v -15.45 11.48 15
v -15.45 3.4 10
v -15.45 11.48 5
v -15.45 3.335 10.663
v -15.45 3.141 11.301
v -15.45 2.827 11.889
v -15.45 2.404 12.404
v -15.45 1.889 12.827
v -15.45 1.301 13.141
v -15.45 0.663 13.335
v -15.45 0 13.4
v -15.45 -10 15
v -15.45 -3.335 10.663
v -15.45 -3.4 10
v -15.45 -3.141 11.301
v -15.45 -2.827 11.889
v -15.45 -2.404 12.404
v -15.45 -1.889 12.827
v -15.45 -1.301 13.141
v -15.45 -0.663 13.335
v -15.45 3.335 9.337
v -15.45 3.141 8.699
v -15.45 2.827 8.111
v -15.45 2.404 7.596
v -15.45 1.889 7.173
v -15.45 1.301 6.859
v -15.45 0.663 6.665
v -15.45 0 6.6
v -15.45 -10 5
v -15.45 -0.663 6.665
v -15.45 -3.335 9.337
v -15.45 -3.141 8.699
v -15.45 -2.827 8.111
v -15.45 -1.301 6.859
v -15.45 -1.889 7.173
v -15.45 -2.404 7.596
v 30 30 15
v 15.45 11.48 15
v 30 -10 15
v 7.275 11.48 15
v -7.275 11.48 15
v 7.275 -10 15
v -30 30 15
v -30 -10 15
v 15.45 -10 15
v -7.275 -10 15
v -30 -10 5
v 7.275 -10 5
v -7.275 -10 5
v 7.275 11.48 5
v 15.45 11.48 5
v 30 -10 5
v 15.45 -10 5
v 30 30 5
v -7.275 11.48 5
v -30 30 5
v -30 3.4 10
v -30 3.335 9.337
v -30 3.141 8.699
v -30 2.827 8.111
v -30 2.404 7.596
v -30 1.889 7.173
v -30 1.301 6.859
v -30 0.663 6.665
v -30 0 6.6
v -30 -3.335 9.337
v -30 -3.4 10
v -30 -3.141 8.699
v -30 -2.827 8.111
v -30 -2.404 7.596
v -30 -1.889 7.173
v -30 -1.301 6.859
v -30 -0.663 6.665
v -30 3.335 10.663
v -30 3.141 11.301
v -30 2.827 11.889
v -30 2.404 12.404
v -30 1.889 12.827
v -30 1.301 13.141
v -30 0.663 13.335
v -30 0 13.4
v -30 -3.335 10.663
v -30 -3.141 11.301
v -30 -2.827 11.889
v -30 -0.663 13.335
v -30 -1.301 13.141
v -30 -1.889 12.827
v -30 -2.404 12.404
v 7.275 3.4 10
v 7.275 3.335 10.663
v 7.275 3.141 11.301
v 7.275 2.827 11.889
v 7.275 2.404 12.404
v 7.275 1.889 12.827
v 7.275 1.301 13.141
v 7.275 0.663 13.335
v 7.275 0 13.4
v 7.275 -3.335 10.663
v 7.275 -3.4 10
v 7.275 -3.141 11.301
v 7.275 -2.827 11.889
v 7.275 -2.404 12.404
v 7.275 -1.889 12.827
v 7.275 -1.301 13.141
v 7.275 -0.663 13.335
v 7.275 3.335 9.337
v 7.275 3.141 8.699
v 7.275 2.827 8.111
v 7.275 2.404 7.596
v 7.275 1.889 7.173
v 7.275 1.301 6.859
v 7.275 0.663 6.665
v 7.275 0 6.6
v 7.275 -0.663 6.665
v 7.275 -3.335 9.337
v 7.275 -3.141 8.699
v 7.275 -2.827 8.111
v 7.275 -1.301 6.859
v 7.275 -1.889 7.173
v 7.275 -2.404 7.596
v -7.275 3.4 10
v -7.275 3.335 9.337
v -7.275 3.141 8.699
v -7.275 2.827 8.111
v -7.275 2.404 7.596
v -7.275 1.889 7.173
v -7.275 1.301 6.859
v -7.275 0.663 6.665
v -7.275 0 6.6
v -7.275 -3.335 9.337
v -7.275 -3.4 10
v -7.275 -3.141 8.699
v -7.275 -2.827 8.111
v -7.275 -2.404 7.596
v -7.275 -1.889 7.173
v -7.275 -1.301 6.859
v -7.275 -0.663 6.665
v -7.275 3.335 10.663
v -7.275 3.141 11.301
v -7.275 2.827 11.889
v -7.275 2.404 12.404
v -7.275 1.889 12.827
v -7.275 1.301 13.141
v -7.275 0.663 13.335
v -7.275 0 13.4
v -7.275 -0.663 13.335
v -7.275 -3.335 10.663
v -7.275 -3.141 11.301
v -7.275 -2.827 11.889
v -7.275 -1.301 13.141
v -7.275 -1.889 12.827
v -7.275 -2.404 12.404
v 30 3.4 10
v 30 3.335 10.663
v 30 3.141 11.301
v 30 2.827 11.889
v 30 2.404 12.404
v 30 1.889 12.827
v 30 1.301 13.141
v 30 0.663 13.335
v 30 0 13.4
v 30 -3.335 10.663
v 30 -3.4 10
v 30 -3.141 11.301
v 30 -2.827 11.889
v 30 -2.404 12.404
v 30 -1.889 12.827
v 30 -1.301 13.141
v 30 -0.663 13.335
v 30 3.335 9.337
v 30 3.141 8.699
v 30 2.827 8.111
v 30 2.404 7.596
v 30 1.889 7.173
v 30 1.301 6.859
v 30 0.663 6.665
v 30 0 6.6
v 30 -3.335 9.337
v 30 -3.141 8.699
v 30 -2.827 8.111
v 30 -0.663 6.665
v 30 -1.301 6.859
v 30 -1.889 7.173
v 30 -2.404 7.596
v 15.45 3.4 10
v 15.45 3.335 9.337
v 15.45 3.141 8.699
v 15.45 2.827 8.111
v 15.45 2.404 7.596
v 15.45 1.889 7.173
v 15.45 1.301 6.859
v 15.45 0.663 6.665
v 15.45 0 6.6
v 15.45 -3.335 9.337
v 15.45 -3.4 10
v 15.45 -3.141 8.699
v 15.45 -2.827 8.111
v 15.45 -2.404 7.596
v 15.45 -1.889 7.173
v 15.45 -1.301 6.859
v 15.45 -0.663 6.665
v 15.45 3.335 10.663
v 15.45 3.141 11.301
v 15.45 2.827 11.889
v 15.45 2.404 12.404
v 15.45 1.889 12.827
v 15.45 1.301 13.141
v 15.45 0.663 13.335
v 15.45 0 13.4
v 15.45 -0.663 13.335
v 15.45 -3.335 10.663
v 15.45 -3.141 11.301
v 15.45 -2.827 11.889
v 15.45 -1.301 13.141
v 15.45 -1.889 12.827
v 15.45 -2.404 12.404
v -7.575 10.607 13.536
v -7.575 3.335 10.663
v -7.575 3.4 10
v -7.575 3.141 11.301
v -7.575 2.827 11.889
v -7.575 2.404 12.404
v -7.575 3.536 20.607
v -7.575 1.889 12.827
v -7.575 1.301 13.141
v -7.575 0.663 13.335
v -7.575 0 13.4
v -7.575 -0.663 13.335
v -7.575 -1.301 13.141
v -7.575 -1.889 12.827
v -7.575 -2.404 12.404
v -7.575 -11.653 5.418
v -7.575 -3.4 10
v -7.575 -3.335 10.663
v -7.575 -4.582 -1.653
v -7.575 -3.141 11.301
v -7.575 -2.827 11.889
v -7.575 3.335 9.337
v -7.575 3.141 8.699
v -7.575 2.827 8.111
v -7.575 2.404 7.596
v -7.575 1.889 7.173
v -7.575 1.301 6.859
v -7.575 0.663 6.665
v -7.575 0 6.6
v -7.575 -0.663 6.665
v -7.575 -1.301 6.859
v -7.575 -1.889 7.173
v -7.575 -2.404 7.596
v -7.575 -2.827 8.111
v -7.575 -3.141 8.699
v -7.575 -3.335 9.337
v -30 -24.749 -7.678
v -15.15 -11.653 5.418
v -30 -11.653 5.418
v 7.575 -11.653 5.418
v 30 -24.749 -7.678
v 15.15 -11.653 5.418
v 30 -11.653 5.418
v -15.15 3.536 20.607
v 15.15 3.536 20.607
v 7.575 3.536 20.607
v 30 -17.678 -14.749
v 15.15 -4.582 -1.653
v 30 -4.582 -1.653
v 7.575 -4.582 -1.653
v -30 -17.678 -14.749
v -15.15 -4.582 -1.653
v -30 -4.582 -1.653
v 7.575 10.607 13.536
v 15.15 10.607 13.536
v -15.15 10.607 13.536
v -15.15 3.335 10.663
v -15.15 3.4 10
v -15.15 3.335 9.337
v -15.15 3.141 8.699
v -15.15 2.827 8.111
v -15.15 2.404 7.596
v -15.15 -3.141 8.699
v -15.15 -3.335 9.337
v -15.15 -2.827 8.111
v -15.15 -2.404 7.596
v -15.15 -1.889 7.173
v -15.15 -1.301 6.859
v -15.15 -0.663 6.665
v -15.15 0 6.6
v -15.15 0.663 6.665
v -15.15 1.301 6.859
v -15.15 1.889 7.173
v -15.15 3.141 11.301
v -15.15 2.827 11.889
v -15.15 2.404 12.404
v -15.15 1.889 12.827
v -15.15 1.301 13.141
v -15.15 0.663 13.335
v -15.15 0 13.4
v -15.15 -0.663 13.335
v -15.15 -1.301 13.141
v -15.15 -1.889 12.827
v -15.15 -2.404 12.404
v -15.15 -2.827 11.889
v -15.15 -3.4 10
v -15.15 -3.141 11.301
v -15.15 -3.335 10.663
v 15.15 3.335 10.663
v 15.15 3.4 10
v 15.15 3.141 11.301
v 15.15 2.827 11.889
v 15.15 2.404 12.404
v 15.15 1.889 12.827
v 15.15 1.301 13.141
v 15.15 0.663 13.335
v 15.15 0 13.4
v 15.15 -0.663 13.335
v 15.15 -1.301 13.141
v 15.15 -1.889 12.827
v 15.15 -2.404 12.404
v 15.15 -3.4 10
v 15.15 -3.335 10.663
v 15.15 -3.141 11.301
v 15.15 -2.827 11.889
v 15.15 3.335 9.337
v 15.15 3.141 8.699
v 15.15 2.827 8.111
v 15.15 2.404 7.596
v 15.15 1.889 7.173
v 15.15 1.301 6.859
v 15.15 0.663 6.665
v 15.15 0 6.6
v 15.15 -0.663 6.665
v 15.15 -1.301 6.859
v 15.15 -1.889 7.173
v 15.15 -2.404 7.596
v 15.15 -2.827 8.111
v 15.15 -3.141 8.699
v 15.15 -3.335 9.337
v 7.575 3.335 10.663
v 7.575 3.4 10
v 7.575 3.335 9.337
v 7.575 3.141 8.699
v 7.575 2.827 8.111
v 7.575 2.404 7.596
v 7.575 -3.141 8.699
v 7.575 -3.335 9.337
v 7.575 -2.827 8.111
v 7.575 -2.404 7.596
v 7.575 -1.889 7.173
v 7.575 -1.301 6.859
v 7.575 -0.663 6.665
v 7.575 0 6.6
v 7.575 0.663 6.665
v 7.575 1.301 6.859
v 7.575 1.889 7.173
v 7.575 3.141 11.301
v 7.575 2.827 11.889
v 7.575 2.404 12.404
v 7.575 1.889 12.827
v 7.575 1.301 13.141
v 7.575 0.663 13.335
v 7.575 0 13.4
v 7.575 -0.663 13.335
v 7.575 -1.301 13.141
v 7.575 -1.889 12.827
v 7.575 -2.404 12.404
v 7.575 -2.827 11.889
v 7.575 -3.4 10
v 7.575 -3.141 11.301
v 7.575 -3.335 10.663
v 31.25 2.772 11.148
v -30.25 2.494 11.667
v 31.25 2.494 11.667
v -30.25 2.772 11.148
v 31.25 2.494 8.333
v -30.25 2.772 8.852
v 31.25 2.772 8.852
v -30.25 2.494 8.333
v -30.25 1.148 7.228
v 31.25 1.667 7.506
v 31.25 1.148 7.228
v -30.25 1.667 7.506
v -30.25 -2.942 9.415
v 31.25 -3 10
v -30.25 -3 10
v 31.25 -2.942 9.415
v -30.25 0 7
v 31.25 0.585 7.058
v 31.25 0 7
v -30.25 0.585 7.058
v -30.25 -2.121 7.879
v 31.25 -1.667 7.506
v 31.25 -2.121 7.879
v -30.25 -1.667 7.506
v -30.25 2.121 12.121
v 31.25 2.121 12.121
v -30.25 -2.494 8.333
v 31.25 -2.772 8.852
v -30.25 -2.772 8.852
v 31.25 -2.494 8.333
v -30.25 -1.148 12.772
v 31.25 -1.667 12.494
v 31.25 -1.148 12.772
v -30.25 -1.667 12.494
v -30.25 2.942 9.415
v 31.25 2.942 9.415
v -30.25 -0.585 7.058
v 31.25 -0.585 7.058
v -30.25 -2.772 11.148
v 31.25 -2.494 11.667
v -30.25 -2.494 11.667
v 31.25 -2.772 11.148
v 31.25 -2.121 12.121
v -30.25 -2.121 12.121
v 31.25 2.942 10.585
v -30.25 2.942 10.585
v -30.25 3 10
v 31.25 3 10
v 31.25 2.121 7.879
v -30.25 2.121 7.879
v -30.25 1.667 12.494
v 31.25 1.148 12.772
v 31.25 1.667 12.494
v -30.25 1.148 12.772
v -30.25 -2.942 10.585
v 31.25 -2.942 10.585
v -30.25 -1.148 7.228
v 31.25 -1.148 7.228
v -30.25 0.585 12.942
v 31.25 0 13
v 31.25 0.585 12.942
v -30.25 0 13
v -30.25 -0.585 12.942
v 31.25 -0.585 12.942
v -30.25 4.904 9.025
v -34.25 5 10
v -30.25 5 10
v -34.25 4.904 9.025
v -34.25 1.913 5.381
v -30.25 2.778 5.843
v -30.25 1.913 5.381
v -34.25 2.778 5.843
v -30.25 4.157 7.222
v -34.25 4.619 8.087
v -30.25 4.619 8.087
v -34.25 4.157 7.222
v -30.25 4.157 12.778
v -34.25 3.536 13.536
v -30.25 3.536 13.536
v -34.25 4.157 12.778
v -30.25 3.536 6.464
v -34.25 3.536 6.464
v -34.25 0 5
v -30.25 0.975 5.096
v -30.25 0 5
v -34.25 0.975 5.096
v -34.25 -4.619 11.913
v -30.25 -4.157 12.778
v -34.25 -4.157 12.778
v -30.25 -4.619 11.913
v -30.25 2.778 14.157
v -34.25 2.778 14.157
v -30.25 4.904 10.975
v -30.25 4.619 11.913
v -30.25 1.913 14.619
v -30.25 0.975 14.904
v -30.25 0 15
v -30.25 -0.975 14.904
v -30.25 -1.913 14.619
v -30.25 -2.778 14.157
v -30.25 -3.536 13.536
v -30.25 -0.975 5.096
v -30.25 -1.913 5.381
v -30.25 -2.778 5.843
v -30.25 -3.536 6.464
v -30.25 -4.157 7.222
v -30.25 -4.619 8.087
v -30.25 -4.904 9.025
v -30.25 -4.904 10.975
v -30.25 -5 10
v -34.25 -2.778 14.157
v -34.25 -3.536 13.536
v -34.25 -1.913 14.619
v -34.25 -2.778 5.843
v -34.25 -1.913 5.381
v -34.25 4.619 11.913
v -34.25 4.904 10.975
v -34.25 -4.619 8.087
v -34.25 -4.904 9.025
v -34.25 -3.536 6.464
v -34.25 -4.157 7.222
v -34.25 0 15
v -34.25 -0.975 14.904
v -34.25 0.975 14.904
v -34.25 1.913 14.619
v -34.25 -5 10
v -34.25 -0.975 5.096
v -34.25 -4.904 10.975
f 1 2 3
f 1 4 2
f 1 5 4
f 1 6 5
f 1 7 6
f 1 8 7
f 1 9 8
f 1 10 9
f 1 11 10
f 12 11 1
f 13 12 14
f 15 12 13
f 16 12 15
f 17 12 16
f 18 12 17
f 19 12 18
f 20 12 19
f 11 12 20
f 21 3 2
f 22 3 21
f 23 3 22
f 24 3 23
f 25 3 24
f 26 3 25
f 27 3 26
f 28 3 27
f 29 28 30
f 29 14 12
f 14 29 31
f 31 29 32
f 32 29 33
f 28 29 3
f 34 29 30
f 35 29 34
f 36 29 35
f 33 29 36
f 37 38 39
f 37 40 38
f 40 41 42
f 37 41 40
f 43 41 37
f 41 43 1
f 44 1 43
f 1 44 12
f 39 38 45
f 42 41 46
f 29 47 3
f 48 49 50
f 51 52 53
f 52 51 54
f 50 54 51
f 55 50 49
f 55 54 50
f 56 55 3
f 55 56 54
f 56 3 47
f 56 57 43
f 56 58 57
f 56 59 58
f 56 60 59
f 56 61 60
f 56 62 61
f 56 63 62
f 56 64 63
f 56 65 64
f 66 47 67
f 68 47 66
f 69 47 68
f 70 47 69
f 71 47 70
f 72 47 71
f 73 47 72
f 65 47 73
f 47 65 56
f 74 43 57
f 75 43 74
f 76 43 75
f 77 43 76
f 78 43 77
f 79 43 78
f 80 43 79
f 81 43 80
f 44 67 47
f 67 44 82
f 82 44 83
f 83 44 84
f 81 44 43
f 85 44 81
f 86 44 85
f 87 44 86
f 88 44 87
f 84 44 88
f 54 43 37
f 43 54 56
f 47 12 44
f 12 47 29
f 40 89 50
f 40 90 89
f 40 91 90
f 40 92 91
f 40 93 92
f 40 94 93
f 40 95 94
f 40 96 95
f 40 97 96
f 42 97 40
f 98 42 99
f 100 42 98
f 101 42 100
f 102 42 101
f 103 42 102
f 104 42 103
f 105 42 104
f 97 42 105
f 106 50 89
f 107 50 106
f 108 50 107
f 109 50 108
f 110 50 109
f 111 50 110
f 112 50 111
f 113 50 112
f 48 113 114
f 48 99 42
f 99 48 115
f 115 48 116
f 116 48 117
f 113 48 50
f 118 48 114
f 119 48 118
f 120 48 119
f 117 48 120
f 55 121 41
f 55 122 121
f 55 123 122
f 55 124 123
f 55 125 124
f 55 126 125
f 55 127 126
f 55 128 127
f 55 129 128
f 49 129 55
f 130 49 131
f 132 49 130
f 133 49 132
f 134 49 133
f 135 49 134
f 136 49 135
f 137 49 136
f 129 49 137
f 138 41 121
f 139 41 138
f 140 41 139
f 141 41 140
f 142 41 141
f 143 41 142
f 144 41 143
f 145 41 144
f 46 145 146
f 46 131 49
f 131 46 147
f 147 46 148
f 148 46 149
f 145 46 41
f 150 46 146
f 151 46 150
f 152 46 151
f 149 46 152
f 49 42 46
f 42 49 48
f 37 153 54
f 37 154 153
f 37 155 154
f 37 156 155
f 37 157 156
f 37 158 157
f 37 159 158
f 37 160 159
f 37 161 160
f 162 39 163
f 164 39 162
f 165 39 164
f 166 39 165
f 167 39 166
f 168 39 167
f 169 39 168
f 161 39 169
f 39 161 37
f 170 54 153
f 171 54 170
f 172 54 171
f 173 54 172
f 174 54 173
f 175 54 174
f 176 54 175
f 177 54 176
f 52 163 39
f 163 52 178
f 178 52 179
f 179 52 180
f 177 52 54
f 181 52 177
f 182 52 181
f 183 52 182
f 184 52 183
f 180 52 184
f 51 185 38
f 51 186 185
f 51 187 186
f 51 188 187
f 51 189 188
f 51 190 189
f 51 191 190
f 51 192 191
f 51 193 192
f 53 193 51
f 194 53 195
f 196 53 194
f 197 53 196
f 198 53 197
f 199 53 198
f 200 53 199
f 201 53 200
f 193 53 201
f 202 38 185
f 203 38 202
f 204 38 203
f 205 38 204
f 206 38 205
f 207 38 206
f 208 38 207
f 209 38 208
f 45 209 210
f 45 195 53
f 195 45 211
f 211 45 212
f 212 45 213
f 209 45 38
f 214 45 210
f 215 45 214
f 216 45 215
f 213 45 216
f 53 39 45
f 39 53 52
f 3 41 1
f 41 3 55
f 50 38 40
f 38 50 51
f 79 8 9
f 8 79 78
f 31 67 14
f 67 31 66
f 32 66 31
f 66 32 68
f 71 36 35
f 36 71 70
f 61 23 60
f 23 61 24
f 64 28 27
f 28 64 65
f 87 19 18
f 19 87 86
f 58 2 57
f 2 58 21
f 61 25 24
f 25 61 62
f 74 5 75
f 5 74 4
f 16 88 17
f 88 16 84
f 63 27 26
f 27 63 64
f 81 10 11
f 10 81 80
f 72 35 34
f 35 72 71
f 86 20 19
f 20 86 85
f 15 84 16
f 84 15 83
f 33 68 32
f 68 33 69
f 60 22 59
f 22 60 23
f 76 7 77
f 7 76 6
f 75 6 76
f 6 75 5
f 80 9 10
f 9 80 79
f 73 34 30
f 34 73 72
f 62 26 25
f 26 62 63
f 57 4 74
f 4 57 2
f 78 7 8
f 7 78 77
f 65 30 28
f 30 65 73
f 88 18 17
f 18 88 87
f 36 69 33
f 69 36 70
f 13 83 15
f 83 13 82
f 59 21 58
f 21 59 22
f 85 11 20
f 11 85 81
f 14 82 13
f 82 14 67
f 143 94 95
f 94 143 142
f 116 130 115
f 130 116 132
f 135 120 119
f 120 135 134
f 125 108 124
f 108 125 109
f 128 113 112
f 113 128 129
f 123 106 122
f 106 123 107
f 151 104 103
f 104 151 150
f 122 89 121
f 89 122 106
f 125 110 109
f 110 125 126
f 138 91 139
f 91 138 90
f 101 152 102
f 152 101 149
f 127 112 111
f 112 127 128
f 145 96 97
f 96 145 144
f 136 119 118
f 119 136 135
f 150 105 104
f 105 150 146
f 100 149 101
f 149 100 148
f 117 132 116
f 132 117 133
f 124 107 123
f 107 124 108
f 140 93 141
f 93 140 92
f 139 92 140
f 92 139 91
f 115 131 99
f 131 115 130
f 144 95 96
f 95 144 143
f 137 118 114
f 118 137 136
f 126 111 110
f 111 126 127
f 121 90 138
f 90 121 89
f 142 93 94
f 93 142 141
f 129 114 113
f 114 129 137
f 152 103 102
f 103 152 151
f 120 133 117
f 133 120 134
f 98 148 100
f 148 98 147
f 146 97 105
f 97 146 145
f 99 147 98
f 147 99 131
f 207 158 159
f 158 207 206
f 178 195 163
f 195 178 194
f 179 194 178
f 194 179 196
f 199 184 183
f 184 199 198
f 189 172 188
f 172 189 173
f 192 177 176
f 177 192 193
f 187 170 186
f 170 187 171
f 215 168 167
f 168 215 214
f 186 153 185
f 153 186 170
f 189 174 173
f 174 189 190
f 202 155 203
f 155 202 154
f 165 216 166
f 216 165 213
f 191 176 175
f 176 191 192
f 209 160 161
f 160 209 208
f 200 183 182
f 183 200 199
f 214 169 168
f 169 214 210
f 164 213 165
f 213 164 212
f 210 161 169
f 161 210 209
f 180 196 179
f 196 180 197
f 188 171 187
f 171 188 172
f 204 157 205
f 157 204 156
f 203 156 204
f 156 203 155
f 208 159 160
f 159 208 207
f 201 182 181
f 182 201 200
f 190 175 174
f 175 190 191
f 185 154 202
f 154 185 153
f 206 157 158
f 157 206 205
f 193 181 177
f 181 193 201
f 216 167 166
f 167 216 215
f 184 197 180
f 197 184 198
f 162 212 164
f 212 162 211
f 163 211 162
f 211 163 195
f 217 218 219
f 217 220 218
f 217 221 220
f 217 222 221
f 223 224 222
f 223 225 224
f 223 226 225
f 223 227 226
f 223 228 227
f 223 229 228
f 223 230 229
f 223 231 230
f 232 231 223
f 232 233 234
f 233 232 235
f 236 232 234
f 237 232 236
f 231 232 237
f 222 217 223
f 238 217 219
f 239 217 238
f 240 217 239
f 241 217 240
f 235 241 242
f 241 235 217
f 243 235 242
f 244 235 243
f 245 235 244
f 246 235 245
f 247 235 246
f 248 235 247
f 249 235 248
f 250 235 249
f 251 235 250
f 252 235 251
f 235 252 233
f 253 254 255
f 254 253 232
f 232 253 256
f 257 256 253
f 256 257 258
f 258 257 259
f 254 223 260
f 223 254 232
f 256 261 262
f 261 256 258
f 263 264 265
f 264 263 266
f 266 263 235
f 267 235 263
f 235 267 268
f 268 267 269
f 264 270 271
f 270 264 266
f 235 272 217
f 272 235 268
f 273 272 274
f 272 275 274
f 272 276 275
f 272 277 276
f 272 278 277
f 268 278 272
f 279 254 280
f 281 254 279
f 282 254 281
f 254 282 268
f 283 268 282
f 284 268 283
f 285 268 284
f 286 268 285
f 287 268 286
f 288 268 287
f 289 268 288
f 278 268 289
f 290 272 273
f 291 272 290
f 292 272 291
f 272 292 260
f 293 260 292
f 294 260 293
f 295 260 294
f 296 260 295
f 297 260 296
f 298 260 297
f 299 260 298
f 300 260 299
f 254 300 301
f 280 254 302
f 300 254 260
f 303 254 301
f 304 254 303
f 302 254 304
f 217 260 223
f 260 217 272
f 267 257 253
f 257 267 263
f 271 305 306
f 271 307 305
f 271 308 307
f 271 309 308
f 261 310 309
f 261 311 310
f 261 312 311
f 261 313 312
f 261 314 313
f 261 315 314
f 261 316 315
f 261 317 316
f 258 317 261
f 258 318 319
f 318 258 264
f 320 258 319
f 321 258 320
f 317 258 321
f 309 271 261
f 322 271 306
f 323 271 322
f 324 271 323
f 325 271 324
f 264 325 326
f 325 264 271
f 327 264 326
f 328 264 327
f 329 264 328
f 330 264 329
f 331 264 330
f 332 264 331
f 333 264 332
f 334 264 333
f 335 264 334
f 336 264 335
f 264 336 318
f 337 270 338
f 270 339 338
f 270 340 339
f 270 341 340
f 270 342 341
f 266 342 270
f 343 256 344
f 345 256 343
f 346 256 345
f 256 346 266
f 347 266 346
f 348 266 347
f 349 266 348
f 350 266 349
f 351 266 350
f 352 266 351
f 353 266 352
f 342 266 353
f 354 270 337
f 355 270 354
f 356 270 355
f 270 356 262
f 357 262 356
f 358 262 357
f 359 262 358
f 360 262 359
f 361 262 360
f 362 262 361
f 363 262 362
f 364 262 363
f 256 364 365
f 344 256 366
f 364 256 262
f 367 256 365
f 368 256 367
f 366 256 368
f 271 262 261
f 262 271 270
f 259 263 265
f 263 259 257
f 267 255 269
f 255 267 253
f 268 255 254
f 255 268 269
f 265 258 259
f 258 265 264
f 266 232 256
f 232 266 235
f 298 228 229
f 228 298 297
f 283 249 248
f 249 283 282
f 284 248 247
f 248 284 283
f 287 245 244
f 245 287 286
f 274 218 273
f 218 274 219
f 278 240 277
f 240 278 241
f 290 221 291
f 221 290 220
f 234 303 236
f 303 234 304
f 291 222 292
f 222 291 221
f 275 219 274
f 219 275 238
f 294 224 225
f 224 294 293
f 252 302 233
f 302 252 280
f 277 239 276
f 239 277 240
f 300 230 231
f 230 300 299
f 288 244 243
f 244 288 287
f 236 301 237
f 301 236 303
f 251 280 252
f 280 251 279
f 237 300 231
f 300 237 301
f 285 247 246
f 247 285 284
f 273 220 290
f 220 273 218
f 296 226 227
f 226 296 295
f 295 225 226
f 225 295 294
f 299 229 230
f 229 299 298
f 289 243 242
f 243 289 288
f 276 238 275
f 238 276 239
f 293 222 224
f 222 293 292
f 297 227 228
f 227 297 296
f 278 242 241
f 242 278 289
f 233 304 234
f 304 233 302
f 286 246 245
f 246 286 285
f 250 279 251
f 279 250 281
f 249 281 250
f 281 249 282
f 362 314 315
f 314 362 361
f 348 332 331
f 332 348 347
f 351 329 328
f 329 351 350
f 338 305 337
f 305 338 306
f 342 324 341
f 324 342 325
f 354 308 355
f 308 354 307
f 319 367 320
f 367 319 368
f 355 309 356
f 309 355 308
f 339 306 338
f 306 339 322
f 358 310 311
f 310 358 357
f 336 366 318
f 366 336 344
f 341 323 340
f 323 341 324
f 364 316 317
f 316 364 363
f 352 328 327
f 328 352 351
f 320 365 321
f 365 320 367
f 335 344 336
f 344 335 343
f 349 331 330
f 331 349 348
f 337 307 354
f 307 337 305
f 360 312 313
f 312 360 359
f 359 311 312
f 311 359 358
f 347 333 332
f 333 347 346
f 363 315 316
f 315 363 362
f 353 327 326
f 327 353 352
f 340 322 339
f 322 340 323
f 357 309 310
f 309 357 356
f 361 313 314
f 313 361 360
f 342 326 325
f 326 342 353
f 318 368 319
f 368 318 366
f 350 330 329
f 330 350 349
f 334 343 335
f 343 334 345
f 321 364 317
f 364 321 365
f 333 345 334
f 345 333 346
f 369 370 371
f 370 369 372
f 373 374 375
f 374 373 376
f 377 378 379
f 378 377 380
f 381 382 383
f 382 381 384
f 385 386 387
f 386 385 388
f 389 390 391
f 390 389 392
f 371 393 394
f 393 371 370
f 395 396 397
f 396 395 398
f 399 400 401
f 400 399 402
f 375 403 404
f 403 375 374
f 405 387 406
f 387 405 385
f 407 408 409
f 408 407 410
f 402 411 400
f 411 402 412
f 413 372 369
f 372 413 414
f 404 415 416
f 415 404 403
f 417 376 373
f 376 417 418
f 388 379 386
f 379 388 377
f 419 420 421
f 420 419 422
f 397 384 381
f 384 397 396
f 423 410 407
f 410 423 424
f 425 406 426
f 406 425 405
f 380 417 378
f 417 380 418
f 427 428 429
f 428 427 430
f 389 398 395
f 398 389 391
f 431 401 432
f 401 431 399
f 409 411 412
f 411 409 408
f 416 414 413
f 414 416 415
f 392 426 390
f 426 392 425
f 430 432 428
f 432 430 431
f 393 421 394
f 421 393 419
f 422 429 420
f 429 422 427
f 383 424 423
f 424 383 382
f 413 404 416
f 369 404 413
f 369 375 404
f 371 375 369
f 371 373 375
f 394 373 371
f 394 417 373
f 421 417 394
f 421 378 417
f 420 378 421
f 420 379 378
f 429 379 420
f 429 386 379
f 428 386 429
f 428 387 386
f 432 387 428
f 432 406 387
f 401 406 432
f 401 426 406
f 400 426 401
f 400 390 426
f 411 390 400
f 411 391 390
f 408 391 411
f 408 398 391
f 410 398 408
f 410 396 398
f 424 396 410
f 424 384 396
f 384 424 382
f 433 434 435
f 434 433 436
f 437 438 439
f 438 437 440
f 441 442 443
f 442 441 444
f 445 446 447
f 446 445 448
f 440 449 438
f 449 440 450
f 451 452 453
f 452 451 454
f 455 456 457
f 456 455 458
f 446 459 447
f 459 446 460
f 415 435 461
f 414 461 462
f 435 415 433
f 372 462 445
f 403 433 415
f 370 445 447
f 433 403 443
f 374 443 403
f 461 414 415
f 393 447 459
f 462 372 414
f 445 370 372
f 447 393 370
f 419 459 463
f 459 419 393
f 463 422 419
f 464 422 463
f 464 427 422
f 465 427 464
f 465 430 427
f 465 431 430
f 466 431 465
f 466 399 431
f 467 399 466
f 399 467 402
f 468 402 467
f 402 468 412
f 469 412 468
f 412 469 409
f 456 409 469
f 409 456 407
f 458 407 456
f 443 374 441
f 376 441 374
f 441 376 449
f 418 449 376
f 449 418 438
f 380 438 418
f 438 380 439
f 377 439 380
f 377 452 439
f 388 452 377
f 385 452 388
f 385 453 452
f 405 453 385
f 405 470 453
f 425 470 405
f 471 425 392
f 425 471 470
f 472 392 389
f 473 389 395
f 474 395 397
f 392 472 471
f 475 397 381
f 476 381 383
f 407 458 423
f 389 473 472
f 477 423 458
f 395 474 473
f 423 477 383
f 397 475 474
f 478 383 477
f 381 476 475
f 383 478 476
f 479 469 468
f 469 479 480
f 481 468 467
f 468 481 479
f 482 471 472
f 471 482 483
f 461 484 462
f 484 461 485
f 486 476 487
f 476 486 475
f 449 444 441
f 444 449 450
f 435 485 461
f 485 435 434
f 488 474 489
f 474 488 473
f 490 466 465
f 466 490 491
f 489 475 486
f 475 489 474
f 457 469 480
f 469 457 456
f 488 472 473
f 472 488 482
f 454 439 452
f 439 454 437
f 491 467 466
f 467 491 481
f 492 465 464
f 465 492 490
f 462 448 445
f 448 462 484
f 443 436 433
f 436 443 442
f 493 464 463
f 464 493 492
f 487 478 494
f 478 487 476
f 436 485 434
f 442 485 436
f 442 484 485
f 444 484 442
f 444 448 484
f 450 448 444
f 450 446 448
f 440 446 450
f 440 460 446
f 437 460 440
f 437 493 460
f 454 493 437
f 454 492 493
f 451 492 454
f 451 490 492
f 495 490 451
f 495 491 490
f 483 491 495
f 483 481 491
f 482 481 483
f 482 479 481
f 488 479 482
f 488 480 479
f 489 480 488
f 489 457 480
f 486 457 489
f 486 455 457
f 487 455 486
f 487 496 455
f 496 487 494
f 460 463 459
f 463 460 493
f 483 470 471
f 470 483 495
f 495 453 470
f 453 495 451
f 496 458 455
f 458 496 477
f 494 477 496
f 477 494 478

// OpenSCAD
$fn = 32;

// ------------------------------------------------------------------------
// Butt hinge: hinge 60 mm, leaf swung 45 deg
// Every part is its own module, assembly() places every instance.
// ------------------------------------------------------------------------

// --- part 1 ---
module hinge_base() {
  difference() {
    union() {
      translate([-30, -10, -5]) cube([14.55, 40, 10]);
      translate([-7.275, -10, -5]) cube([14.55, 40, 10]);
      translate([15.45, -10, -5]) cube([14.55, 40, 10]);
      translate([-30, 11.48, -5]) cube([60, 18.52, 10]);
    }
    translate([-22.725, 0, 0]) rotate([0, 90, 0]) cylinder(h = 16.55, d = 6.8, center = true);
    translate([0, 0, 0]) rotate([0, 90, 0]) cylinder(h = 16.55, d = 6.8, center = true);
    translate([22.725, 0, 0]) rotate([0, 90, 0]) cylinder(h = 16.55, d = 6.8, center = true);
  }
}

// --- part 2 ---
module hinge_mover() {
  difference() {
    union() {
      translate([-15.15, -30, -5]) cube([7.575, 40, 10]);
      translate([7.575, -30, -5]) cube([7.575, 40, 10]);
      translate([-30, -30, -5]) cube([60, 18.52, 10]);
    }
    translate([-11.362, 0, 0]) rotate([0, 90, 0]) cylinder(h = 9.575, d = 6.8, center = true);
    translate([11.362, 0, 0]) rotate([0, 90, 0]) cylinder(h = 9.575, d = 6.8, center = true);
  }
}

// --- part 3 ---
module hinge_pin() {
  rotate([0, 90, 0]) cylinder(h = 62.5, d = 6, center = true);
  translate([-34.25, 0, 0]) rotate([0, 90, 0]) cylinder(h = 4, d = 10);
}

// --- assembly ---
module assembly() {
  color([0.80, 0.24, 0.20]) translate([0, 0, 10]) rotate([0, 0, 0]) hinge_base();
  color([0.20, 0.45, 0.75]) translate([0, 0, 10]) rotate([45, 0, 0]) hinge_mover();
  color([0.25, 0.62, 0.32]) translate([0, 0, 10]) rotate([0, 0, 0]) hinge_pin();
}

assembly();
